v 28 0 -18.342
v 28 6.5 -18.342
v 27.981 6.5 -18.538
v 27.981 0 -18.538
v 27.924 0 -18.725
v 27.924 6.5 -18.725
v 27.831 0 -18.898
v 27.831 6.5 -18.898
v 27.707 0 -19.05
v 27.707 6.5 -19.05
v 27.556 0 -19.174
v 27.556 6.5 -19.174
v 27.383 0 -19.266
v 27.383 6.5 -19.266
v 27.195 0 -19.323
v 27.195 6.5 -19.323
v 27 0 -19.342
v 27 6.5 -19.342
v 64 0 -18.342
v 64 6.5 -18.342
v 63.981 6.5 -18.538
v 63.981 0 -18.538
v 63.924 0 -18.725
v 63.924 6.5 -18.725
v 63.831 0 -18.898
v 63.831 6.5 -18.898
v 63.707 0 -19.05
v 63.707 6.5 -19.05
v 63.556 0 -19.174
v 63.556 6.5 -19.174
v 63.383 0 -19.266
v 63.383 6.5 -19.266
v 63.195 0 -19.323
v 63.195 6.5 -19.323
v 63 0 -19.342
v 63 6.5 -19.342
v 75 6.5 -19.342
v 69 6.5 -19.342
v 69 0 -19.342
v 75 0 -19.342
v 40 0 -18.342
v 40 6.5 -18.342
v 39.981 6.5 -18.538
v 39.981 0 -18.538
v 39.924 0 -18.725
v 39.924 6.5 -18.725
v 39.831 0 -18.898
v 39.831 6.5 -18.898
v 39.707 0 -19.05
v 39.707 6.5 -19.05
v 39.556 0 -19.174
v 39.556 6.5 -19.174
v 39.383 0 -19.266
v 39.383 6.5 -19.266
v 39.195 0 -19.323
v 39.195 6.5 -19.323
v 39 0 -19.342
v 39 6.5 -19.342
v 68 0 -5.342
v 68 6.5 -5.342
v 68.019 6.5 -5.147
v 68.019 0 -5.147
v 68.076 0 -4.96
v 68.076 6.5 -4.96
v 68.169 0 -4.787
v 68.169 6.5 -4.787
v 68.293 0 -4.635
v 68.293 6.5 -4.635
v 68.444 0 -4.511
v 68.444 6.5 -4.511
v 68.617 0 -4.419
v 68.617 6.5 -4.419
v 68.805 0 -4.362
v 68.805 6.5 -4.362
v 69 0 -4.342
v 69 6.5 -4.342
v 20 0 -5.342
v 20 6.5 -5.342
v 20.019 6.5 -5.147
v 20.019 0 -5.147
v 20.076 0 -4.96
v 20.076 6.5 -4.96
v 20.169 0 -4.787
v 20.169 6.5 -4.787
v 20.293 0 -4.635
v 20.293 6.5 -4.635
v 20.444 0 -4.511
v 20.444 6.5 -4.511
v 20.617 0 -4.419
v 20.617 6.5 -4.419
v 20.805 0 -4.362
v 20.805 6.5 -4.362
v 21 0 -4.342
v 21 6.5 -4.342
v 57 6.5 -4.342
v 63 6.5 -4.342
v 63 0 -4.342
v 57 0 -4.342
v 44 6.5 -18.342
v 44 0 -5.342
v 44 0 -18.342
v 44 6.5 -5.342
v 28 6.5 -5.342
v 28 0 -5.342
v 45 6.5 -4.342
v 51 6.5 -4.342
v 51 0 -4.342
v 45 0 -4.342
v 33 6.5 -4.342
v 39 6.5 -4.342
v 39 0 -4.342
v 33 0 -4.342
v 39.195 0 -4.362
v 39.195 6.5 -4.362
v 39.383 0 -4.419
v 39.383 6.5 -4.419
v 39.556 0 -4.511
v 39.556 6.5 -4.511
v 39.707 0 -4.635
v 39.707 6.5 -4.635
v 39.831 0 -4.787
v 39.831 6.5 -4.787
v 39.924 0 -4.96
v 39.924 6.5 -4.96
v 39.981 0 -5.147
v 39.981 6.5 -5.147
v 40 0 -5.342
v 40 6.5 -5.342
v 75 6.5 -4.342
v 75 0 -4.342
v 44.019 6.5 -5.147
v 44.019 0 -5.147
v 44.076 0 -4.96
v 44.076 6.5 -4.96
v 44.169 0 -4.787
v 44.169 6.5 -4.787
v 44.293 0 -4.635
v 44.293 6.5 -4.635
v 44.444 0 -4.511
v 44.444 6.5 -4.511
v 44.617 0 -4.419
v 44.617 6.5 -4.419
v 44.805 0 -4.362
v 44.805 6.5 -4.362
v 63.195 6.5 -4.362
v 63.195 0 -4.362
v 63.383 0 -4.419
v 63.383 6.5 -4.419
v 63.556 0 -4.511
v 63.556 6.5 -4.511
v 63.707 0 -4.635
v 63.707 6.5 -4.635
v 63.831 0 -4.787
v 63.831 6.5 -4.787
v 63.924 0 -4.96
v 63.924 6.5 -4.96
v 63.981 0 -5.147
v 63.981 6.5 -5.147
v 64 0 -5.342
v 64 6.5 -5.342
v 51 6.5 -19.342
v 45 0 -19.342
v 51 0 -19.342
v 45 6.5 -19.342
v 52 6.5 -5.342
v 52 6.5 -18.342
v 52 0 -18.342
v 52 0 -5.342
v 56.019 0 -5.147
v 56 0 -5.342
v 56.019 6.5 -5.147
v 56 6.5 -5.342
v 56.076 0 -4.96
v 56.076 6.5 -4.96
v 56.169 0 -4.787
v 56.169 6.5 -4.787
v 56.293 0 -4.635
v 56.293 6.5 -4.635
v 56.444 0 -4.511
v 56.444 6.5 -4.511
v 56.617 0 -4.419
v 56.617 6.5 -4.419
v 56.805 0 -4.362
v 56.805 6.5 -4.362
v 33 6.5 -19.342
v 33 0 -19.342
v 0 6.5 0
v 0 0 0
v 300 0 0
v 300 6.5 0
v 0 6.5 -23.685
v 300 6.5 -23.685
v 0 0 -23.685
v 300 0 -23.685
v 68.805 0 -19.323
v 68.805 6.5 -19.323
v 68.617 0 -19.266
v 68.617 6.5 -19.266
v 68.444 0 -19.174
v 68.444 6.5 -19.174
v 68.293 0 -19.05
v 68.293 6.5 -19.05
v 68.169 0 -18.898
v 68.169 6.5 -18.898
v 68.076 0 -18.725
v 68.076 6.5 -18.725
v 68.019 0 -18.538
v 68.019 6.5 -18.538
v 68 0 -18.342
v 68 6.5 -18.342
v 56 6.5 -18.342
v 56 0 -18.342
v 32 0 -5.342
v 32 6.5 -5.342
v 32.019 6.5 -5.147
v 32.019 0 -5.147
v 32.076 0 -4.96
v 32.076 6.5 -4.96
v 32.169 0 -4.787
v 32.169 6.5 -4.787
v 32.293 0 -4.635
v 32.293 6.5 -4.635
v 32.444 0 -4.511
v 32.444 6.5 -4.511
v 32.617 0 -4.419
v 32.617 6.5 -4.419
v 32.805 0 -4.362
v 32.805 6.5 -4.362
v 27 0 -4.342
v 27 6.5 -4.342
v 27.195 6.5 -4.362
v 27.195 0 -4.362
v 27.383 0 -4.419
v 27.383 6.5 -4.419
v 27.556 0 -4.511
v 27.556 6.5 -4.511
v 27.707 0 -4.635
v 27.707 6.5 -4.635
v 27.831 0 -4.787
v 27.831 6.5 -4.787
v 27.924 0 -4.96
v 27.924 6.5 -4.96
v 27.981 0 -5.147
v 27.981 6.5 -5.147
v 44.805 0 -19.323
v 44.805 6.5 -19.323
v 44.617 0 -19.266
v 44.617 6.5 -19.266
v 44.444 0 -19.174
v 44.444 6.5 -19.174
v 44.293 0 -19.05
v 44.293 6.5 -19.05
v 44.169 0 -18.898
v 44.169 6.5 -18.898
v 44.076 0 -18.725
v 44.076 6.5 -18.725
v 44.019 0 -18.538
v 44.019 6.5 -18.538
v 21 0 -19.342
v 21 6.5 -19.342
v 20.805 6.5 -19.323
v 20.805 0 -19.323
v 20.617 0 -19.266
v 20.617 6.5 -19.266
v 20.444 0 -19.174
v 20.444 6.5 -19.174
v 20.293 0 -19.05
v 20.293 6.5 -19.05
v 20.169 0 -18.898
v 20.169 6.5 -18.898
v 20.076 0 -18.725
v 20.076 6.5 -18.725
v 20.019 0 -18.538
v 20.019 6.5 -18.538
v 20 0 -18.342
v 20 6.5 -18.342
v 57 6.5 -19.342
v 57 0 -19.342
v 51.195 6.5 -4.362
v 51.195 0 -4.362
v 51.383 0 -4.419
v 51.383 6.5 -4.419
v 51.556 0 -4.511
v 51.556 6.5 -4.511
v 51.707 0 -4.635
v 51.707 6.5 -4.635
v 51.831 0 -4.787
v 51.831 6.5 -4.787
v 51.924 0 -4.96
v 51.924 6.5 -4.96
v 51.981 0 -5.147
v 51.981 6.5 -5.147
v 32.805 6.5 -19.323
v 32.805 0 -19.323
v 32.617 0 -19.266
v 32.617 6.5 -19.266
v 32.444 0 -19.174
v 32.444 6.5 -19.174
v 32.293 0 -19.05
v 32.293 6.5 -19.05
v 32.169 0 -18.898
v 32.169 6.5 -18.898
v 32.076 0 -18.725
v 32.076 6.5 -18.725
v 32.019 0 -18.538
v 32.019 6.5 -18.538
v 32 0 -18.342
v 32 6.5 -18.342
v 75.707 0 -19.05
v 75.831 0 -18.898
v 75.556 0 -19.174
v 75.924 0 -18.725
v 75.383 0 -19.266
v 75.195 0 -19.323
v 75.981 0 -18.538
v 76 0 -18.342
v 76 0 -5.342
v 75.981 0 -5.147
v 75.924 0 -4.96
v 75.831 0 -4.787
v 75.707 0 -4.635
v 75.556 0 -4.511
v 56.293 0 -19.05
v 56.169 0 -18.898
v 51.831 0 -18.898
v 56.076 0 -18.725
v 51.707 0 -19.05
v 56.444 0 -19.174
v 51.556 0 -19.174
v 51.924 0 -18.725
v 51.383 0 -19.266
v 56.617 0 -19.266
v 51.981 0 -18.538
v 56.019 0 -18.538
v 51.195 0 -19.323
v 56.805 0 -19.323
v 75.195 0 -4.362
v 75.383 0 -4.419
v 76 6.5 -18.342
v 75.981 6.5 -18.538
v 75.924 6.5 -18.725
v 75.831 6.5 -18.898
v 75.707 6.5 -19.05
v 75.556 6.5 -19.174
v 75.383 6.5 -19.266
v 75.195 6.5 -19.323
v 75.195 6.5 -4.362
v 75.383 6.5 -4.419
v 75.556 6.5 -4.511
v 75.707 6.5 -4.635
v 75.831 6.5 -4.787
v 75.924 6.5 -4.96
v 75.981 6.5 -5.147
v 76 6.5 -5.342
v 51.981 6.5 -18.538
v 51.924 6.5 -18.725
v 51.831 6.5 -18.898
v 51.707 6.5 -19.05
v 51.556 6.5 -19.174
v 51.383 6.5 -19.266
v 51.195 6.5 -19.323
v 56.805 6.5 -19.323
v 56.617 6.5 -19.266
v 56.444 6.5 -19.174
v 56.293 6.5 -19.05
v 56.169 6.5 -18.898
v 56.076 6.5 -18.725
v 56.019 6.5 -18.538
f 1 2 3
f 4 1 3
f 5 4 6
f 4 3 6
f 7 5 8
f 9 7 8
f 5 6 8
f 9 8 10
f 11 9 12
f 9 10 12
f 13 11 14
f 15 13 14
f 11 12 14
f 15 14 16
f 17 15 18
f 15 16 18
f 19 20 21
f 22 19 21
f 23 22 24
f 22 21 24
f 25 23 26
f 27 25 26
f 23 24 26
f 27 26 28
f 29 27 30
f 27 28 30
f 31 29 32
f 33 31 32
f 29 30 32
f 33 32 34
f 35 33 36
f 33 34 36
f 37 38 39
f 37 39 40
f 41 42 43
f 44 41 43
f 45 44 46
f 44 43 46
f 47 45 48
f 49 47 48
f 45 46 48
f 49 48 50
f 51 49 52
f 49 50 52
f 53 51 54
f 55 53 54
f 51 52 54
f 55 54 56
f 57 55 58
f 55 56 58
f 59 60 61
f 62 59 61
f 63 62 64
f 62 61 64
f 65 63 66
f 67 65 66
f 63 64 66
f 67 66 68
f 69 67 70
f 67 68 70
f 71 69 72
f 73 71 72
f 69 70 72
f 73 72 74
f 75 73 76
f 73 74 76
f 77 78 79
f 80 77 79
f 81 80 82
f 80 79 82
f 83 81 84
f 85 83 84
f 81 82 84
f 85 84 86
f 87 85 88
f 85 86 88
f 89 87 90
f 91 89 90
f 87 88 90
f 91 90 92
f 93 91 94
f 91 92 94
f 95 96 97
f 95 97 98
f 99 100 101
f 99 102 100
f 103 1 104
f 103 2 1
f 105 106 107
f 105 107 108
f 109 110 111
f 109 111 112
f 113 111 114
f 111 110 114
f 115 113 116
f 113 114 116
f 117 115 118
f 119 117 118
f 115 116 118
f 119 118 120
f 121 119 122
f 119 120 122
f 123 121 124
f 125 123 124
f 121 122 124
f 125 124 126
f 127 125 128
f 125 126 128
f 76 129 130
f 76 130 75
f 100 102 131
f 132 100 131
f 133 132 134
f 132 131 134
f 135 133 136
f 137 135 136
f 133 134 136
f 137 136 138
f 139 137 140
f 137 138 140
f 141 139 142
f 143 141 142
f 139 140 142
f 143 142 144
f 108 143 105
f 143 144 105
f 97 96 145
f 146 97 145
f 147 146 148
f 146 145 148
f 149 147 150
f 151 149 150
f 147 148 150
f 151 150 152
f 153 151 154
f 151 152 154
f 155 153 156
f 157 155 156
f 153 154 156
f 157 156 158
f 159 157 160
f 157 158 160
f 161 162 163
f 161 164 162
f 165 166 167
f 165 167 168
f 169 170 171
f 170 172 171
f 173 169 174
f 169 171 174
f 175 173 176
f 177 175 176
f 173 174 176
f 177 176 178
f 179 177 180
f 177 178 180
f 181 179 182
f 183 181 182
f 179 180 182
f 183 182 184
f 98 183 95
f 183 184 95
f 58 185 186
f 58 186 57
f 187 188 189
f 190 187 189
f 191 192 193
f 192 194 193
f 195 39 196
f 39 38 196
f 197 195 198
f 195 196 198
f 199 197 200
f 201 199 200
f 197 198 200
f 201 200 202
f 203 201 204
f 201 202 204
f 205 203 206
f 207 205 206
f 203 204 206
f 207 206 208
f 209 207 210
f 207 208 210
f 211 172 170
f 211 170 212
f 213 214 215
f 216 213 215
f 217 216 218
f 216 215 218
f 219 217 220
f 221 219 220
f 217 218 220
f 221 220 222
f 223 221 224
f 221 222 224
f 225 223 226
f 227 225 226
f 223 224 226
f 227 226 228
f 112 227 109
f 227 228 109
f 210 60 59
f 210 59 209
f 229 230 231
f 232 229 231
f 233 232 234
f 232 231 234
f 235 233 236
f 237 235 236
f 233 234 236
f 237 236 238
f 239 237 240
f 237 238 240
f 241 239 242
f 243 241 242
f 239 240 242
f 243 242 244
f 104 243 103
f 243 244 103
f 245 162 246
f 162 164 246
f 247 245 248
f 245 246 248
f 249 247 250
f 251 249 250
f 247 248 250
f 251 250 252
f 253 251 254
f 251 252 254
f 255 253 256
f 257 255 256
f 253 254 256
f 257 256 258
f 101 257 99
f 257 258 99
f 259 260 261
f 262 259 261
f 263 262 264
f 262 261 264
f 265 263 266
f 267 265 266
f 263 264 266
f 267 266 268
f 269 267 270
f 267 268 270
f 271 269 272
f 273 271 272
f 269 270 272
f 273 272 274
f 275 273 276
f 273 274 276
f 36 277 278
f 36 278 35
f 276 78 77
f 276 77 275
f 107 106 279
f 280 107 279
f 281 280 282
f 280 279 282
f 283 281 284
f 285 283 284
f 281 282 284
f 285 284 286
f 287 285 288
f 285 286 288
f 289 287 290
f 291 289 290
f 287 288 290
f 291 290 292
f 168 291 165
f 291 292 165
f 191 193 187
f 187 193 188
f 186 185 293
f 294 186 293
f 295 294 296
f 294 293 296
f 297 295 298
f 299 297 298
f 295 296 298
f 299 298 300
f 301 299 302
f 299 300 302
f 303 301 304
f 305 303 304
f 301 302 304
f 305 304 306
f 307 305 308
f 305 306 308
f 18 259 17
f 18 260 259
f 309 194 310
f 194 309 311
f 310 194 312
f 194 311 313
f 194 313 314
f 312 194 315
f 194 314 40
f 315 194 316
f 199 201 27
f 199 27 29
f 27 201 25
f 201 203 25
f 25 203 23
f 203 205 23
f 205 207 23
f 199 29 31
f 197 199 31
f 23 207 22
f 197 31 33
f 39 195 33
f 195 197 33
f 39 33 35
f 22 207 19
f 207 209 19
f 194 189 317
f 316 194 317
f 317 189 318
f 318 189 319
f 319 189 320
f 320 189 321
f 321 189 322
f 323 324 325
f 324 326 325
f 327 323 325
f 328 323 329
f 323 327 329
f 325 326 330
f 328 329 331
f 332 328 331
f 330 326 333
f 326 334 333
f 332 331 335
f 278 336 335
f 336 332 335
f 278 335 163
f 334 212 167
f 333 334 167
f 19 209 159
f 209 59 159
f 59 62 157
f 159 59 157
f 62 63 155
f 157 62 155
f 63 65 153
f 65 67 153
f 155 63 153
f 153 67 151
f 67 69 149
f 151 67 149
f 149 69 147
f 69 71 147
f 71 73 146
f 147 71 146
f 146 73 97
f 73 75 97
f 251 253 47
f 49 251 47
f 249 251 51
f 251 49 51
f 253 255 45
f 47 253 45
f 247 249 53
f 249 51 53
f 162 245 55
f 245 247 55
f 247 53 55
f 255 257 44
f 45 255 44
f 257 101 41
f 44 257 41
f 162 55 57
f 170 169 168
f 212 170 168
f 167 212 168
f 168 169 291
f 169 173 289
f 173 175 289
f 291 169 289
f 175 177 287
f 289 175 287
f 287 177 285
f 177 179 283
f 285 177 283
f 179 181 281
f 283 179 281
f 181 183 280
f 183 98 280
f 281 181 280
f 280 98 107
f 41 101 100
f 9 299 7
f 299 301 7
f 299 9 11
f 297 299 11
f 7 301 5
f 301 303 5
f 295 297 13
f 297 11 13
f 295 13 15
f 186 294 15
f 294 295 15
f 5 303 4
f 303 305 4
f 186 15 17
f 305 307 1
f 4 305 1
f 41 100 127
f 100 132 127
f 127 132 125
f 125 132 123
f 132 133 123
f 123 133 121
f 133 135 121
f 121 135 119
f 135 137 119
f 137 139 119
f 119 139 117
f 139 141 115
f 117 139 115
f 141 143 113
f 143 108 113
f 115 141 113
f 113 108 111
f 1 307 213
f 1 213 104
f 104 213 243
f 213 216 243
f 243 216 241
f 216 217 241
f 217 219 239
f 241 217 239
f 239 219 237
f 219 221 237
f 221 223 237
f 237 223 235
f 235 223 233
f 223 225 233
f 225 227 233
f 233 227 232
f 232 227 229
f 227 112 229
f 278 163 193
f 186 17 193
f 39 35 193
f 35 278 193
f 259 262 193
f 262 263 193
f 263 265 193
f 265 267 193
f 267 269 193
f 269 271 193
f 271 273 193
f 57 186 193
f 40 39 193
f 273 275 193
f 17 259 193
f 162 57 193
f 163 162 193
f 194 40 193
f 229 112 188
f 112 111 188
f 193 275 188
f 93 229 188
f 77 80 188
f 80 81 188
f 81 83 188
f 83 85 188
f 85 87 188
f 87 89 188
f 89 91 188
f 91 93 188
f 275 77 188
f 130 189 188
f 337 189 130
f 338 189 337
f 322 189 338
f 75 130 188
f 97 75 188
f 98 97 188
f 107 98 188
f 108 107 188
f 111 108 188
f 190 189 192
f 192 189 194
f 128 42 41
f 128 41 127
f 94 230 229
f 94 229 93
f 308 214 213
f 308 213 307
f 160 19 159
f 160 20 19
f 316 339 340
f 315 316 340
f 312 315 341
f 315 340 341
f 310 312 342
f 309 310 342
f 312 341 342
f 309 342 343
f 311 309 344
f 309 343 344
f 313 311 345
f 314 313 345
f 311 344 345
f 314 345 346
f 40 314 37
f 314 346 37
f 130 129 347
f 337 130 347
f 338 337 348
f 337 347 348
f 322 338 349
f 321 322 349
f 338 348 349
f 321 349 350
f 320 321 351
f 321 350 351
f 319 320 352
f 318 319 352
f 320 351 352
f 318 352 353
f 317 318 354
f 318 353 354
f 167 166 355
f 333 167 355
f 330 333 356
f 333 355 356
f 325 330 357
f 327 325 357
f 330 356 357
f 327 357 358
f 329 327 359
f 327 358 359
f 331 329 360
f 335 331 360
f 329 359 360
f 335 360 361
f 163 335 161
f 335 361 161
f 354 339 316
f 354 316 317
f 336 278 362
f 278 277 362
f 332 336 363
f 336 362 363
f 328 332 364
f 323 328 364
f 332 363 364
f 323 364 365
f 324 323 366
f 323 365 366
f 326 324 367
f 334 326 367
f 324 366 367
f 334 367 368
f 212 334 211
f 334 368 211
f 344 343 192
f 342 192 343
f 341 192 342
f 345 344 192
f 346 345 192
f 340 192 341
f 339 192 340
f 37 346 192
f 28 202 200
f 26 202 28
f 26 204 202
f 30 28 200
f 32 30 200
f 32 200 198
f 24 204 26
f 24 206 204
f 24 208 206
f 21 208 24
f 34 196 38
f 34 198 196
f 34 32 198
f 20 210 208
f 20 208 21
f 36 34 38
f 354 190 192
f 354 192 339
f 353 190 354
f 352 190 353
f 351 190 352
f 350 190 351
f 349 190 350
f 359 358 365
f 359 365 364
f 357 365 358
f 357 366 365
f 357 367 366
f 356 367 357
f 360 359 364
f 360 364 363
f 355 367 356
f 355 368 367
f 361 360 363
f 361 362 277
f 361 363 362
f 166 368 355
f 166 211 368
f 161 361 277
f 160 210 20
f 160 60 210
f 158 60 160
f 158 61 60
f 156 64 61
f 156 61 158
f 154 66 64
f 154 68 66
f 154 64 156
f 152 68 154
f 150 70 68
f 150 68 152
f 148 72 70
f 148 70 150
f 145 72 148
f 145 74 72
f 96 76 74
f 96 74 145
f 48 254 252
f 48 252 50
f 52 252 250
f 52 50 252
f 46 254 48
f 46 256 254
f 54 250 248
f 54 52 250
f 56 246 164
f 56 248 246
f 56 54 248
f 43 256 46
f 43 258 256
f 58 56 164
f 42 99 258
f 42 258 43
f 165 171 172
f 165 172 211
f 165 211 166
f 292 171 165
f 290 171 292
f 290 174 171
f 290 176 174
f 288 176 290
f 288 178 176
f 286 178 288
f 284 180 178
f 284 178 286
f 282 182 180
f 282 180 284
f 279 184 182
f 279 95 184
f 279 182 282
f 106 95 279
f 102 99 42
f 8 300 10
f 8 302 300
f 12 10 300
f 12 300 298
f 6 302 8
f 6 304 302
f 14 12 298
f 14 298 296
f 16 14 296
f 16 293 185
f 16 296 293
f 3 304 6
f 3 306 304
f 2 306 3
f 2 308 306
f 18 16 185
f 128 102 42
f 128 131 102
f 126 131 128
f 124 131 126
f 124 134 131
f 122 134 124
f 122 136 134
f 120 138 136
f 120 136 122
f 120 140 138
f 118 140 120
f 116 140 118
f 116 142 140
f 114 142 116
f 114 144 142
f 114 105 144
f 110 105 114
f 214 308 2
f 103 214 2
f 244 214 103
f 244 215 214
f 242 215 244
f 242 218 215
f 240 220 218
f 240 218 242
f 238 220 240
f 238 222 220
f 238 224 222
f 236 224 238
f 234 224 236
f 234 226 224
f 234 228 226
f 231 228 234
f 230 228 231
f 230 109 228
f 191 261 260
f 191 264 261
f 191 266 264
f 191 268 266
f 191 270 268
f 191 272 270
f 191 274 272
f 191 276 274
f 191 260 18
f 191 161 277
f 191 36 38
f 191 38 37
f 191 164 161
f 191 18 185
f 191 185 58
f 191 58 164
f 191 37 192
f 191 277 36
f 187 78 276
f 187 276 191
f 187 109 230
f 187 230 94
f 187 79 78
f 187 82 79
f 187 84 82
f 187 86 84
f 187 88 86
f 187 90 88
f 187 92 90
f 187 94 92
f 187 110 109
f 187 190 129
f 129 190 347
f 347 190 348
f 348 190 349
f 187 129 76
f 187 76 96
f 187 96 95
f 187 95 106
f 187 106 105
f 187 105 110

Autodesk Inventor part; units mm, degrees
ref_plane "YZ Plane" through (0, 0, 0) normal (1, 0, 0) x (0, 1, 0)
ref_plane "XZ Plane" through (0, 0, 0) normal (0, 1, 0) x (-1, 0, 0)
ref_plane "XY Plane" through (0, 0, 0) normal (0, 0, 1) x (1, 0, 0)
sketch "Sketch1" plane through (0, 0, 0) normal (0, 1, 0) x (-1, 0, 0)
  line L0 (0, 0) -> (-300, 0)
  line L1 (-300, 0) -> (-300, -23.685)
  line L2 (-300, -23.685) -> (0, -23.685)
  line L3 (0, -23.685) -> (0, 0)
  dimension "d0" = 300
  dimension "d1" = 23.685
extrude "Extrusion1" add sketch "Sketch1" along normal blind 6.5
sketch "Sketch2" plane through (0, 6.5, 0) normal (0, 1, 0) x (1, 0, 0)
  line L0 (0, 23.685) -> (0, 0) projected
  line L1 (21, 19.3425) -> (27, 19.3425)
  line L2 (28, 18.3425) -> (28, 5.3425)
  line L3 (27, 4.3425) -> (21, 4.3425)
  line L4 (20, 5.3425) -> (20, 18.3425)
  arc A0 (21, 19.3425) -> (20, 18.3425) centre (21, 18.3425) ccw
  arc A1 (20, 5.3425) -> (21, 4.3425) centre (21, 5.3425) ccw
  arc A2 (27, 4.3425) -> (28, 5.3425) centre (27, 5.3425) ccw
  arc A3 (28, 18.3425) -> (27, 19.3425) centre (27, 18.3425) ccw
  point P0 (20, 11.8425)
  point P1 (0, 11.8425)
  dimension "d4" = 1
  dimension "d5" = 15
  dimension "d6" = 8
  dimension "d7" = 20
extrude "Extrusion2" cut sketch "Sketch2" against normal through all
pattern_linear "Rectangular Pattern1" count 5 spacing 12 along (1, 0, 0) of "Extrusion2"
properties part number "front_pane_middle"
